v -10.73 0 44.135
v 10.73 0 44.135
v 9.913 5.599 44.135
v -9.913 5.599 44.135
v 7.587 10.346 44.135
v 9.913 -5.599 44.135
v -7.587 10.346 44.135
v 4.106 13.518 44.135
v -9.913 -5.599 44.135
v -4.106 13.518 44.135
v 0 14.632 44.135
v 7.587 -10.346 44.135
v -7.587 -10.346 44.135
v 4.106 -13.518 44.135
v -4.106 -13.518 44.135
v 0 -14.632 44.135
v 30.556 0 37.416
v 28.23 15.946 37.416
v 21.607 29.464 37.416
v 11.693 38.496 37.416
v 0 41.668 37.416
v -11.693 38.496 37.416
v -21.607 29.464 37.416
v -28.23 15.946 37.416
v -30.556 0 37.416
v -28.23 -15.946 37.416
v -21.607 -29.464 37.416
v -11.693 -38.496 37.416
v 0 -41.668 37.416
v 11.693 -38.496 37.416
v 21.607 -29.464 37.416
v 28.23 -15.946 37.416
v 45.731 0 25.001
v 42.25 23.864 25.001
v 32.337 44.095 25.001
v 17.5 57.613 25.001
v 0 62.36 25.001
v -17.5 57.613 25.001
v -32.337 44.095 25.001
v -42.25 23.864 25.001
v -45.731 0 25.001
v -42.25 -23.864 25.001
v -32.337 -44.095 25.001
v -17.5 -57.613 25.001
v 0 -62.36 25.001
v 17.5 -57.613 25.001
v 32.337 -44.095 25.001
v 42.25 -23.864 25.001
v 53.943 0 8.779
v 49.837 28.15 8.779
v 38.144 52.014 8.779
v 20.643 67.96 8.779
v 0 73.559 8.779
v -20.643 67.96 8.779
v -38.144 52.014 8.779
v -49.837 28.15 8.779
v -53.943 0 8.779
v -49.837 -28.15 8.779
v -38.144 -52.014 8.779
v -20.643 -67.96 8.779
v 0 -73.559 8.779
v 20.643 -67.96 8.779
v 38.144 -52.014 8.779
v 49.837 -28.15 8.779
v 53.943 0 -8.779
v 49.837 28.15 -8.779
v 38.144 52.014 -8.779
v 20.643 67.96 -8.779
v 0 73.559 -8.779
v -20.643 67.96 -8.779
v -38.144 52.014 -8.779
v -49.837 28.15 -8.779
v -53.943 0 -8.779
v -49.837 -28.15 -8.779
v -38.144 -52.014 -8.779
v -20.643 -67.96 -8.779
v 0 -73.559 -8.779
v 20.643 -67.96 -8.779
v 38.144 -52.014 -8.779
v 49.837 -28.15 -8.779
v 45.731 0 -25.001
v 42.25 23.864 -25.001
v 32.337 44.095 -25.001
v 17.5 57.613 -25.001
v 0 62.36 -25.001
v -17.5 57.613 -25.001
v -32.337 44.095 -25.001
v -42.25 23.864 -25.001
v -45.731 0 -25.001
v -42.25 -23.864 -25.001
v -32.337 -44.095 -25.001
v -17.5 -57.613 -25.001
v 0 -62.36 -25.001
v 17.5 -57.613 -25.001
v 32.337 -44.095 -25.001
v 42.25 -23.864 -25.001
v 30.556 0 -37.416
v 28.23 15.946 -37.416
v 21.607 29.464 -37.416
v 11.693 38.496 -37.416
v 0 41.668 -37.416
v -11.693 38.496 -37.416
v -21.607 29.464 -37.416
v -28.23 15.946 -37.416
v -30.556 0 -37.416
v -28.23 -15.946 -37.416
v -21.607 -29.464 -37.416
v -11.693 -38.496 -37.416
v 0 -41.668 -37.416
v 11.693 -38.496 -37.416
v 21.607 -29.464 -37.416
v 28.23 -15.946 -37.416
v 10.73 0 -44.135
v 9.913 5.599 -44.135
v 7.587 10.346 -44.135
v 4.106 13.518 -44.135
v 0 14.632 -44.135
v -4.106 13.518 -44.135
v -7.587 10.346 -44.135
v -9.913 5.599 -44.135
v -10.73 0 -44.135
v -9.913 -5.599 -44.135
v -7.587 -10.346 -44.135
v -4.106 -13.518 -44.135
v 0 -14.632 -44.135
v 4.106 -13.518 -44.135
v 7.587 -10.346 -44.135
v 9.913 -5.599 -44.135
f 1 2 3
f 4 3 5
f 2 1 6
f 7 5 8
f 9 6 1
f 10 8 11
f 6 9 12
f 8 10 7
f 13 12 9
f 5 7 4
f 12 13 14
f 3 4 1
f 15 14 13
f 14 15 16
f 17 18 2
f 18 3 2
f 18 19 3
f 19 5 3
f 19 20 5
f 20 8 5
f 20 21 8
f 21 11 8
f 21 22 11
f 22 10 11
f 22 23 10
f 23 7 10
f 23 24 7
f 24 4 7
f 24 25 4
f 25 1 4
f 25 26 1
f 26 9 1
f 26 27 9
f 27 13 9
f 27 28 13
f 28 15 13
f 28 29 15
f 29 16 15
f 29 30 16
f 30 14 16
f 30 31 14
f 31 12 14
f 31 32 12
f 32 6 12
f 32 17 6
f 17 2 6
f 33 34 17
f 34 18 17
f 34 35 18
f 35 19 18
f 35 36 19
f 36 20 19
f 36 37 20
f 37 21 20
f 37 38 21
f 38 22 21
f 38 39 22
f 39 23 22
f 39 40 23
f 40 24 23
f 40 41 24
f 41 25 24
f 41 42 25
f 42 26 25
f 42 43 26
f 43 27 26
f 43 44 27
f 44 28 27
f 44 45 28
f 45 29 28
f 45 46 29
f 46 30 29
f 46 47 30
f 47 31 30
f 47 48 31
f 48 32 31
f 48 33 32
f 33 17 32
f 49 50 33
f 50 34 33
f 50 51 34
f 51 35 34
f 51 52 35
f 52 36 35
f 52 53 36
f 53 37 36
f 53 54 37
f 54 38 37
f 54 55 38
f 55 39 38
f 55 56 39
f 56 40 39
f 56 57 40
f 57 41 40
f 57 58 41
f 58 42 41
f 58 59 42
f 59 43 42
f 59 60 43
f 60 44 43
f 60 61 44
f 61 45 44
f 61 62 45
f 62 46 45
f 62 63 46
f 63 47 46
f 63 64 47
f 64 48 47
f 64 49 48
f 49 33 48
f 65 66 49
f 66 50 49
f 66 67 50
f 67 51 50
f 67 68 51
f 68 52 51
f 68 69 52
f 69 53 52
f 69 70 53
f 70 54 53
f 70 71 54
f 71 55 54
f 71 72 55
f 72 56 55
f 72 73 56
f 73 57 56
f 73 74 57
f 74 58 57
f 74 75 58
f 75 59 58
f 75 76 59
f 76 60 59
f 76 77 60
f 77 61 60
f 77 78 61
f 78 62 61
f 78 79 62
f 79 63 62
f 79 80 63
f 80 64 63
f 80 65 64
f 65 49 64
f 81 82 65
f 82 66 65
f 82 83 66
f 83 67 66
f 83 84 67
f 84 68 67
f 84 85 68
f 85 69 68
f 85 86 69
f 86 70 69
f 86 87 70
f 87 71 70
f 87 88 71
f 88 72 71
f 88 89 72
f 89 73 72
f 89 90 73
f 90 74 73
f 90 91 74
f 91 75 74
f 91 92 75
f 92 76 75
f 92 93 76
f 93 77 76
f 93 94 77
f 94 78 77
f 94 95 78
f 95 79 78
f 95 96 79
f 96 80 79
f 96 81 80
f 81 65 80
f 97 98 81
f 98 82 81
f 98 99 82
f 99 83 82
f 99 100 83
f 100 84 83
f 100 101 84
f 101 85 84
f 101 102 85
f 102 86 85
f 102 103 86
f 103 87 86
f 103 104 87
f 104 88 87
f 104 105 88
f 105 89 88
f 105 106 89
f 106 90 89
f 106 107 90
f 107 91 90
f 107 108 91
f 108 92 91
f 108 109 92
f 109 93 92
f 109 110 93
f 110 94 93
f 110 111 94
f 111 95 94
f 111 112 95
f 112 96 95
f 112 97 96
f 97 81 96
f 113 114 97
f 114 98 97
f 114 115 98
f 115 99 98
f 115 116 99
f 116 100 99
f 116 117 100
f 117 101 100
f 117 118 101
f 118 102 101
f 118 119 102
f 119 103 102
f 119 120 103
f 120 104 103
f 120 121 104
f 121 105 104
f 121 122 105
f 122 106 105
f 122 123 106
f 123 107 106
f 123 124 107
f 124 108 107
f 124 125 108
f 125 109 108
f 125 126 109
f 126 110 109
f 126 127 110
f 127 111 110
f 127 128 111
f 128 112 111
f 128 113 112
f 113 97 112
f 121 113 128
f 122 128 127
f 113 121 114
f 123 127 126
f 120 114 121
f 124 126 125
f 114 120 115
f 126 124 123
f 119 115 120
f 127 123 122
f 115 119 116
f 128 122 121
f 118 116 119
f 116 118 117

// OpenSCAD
// Generated by SolidPython 1.0.1 on 2020-07-29 00:46:50


scale(v = [11, 15, 9]) {
	sphere(r = 5);
}
/***********************************************
*********      SolidPython code:      **********
************************************************
 
# import packages: SolidPython
from solid import *
from solid.utils import *
from itertools import chain, combinations, permutations


class Resize:

    def __init__(self, scad_file):
        self.scad_file = scad_file
        #self.scad_file = import_scad(scad_file)
        # cone/cylinder param:
        self.r1 = 0
        self.r2 = 0
        self.h = 0
        # rectangular prism param:
        self.w = 0
        self.l = 0
        # ellipse param:
        self.r = 0

    # import OpenScad code (file name corresponds to shape)


    # classify shape + parameters
    def assign(self, param1, param2, param3):
        if self.scad_file == 'cone.scad':
            self.r1 = param1
            self.r2 = param2
            self.h = param3
        elif self.scad_file == 'cylinder.scad':
            self.r1 = param1
            self.r2 = param2
            self.h = param3
        elif self.scad_file == 'rectangularPrism.scad':
            self.h = param1
            self.l = param2
            self.w = param3
        else:
            self.r = param1
            self.h = param2

    # resize parameters
    def iterate(self):
        x = range(3, 20, 2)
        i = 1
        if self.scad_file == 'cone.scad':
            tempList = list(permutations(x, 2))
            for temp in tempList:
                param1 = temp[0]
                param2 = temp[1]
                filepath = 'produced_scad_files/' + 'cone' + str(param1) + '_' + str(param2) + '_' + '.scad'
                scad_render_to_file(cylinder(h=param1, r1=param2, r2=0), filepath)

        elif self.scad_file == 'cylinder.scad':
            tempList = list(permutations(x, 3))
            for temp in tempList:
                param1 = temp[0]
                param2 = temp[1]
                filepath = 'produced_scad_files/' + 'cylinder' + str(param1) + '_' + str(param2) + '_' + '.scad'
                scad_render_to_file(cylinder(h=param1, r1=param2, r2=param2), filepath)

        elif self.scad_file == 'rectangularPrism.scad':
            tempList = list(permutations(x, 3))
            for temp in tempList:
                param1 = temp[0]
                param2 = temp[1]
                param3 = temp[2]
                filepath = 'produced_scad_files/' + 'rectangularPrism' + str(param1) + '_' + str(param2) + '_' + str(
                    param3) + '.scad'
                scad_render_to_file(cube(size=(param1, param2, param3)), filepath)

        elif self.scad_file == 'ellipse.scad':
            tempList = list(permutations(x, 4))
            for temp in tempList:
                param1 = temp[0]
                param2 = temp[1]
                param3 = temp[2]
                param4 = temp[3]
                filepath = 'produced_scad_files/' + 'ellipse' + str(param1) + '_' + str(param2) + '_' + str(param3) + '_' + str(param4) + '.scad'
                scad_render_to_file(scale([param1, param2, param3])(sphere(r=param4)), filepath)

    def render_to_scadfile(self):
        scad_render_to_file(scad, 'example.scad') 
 
************************************************/
